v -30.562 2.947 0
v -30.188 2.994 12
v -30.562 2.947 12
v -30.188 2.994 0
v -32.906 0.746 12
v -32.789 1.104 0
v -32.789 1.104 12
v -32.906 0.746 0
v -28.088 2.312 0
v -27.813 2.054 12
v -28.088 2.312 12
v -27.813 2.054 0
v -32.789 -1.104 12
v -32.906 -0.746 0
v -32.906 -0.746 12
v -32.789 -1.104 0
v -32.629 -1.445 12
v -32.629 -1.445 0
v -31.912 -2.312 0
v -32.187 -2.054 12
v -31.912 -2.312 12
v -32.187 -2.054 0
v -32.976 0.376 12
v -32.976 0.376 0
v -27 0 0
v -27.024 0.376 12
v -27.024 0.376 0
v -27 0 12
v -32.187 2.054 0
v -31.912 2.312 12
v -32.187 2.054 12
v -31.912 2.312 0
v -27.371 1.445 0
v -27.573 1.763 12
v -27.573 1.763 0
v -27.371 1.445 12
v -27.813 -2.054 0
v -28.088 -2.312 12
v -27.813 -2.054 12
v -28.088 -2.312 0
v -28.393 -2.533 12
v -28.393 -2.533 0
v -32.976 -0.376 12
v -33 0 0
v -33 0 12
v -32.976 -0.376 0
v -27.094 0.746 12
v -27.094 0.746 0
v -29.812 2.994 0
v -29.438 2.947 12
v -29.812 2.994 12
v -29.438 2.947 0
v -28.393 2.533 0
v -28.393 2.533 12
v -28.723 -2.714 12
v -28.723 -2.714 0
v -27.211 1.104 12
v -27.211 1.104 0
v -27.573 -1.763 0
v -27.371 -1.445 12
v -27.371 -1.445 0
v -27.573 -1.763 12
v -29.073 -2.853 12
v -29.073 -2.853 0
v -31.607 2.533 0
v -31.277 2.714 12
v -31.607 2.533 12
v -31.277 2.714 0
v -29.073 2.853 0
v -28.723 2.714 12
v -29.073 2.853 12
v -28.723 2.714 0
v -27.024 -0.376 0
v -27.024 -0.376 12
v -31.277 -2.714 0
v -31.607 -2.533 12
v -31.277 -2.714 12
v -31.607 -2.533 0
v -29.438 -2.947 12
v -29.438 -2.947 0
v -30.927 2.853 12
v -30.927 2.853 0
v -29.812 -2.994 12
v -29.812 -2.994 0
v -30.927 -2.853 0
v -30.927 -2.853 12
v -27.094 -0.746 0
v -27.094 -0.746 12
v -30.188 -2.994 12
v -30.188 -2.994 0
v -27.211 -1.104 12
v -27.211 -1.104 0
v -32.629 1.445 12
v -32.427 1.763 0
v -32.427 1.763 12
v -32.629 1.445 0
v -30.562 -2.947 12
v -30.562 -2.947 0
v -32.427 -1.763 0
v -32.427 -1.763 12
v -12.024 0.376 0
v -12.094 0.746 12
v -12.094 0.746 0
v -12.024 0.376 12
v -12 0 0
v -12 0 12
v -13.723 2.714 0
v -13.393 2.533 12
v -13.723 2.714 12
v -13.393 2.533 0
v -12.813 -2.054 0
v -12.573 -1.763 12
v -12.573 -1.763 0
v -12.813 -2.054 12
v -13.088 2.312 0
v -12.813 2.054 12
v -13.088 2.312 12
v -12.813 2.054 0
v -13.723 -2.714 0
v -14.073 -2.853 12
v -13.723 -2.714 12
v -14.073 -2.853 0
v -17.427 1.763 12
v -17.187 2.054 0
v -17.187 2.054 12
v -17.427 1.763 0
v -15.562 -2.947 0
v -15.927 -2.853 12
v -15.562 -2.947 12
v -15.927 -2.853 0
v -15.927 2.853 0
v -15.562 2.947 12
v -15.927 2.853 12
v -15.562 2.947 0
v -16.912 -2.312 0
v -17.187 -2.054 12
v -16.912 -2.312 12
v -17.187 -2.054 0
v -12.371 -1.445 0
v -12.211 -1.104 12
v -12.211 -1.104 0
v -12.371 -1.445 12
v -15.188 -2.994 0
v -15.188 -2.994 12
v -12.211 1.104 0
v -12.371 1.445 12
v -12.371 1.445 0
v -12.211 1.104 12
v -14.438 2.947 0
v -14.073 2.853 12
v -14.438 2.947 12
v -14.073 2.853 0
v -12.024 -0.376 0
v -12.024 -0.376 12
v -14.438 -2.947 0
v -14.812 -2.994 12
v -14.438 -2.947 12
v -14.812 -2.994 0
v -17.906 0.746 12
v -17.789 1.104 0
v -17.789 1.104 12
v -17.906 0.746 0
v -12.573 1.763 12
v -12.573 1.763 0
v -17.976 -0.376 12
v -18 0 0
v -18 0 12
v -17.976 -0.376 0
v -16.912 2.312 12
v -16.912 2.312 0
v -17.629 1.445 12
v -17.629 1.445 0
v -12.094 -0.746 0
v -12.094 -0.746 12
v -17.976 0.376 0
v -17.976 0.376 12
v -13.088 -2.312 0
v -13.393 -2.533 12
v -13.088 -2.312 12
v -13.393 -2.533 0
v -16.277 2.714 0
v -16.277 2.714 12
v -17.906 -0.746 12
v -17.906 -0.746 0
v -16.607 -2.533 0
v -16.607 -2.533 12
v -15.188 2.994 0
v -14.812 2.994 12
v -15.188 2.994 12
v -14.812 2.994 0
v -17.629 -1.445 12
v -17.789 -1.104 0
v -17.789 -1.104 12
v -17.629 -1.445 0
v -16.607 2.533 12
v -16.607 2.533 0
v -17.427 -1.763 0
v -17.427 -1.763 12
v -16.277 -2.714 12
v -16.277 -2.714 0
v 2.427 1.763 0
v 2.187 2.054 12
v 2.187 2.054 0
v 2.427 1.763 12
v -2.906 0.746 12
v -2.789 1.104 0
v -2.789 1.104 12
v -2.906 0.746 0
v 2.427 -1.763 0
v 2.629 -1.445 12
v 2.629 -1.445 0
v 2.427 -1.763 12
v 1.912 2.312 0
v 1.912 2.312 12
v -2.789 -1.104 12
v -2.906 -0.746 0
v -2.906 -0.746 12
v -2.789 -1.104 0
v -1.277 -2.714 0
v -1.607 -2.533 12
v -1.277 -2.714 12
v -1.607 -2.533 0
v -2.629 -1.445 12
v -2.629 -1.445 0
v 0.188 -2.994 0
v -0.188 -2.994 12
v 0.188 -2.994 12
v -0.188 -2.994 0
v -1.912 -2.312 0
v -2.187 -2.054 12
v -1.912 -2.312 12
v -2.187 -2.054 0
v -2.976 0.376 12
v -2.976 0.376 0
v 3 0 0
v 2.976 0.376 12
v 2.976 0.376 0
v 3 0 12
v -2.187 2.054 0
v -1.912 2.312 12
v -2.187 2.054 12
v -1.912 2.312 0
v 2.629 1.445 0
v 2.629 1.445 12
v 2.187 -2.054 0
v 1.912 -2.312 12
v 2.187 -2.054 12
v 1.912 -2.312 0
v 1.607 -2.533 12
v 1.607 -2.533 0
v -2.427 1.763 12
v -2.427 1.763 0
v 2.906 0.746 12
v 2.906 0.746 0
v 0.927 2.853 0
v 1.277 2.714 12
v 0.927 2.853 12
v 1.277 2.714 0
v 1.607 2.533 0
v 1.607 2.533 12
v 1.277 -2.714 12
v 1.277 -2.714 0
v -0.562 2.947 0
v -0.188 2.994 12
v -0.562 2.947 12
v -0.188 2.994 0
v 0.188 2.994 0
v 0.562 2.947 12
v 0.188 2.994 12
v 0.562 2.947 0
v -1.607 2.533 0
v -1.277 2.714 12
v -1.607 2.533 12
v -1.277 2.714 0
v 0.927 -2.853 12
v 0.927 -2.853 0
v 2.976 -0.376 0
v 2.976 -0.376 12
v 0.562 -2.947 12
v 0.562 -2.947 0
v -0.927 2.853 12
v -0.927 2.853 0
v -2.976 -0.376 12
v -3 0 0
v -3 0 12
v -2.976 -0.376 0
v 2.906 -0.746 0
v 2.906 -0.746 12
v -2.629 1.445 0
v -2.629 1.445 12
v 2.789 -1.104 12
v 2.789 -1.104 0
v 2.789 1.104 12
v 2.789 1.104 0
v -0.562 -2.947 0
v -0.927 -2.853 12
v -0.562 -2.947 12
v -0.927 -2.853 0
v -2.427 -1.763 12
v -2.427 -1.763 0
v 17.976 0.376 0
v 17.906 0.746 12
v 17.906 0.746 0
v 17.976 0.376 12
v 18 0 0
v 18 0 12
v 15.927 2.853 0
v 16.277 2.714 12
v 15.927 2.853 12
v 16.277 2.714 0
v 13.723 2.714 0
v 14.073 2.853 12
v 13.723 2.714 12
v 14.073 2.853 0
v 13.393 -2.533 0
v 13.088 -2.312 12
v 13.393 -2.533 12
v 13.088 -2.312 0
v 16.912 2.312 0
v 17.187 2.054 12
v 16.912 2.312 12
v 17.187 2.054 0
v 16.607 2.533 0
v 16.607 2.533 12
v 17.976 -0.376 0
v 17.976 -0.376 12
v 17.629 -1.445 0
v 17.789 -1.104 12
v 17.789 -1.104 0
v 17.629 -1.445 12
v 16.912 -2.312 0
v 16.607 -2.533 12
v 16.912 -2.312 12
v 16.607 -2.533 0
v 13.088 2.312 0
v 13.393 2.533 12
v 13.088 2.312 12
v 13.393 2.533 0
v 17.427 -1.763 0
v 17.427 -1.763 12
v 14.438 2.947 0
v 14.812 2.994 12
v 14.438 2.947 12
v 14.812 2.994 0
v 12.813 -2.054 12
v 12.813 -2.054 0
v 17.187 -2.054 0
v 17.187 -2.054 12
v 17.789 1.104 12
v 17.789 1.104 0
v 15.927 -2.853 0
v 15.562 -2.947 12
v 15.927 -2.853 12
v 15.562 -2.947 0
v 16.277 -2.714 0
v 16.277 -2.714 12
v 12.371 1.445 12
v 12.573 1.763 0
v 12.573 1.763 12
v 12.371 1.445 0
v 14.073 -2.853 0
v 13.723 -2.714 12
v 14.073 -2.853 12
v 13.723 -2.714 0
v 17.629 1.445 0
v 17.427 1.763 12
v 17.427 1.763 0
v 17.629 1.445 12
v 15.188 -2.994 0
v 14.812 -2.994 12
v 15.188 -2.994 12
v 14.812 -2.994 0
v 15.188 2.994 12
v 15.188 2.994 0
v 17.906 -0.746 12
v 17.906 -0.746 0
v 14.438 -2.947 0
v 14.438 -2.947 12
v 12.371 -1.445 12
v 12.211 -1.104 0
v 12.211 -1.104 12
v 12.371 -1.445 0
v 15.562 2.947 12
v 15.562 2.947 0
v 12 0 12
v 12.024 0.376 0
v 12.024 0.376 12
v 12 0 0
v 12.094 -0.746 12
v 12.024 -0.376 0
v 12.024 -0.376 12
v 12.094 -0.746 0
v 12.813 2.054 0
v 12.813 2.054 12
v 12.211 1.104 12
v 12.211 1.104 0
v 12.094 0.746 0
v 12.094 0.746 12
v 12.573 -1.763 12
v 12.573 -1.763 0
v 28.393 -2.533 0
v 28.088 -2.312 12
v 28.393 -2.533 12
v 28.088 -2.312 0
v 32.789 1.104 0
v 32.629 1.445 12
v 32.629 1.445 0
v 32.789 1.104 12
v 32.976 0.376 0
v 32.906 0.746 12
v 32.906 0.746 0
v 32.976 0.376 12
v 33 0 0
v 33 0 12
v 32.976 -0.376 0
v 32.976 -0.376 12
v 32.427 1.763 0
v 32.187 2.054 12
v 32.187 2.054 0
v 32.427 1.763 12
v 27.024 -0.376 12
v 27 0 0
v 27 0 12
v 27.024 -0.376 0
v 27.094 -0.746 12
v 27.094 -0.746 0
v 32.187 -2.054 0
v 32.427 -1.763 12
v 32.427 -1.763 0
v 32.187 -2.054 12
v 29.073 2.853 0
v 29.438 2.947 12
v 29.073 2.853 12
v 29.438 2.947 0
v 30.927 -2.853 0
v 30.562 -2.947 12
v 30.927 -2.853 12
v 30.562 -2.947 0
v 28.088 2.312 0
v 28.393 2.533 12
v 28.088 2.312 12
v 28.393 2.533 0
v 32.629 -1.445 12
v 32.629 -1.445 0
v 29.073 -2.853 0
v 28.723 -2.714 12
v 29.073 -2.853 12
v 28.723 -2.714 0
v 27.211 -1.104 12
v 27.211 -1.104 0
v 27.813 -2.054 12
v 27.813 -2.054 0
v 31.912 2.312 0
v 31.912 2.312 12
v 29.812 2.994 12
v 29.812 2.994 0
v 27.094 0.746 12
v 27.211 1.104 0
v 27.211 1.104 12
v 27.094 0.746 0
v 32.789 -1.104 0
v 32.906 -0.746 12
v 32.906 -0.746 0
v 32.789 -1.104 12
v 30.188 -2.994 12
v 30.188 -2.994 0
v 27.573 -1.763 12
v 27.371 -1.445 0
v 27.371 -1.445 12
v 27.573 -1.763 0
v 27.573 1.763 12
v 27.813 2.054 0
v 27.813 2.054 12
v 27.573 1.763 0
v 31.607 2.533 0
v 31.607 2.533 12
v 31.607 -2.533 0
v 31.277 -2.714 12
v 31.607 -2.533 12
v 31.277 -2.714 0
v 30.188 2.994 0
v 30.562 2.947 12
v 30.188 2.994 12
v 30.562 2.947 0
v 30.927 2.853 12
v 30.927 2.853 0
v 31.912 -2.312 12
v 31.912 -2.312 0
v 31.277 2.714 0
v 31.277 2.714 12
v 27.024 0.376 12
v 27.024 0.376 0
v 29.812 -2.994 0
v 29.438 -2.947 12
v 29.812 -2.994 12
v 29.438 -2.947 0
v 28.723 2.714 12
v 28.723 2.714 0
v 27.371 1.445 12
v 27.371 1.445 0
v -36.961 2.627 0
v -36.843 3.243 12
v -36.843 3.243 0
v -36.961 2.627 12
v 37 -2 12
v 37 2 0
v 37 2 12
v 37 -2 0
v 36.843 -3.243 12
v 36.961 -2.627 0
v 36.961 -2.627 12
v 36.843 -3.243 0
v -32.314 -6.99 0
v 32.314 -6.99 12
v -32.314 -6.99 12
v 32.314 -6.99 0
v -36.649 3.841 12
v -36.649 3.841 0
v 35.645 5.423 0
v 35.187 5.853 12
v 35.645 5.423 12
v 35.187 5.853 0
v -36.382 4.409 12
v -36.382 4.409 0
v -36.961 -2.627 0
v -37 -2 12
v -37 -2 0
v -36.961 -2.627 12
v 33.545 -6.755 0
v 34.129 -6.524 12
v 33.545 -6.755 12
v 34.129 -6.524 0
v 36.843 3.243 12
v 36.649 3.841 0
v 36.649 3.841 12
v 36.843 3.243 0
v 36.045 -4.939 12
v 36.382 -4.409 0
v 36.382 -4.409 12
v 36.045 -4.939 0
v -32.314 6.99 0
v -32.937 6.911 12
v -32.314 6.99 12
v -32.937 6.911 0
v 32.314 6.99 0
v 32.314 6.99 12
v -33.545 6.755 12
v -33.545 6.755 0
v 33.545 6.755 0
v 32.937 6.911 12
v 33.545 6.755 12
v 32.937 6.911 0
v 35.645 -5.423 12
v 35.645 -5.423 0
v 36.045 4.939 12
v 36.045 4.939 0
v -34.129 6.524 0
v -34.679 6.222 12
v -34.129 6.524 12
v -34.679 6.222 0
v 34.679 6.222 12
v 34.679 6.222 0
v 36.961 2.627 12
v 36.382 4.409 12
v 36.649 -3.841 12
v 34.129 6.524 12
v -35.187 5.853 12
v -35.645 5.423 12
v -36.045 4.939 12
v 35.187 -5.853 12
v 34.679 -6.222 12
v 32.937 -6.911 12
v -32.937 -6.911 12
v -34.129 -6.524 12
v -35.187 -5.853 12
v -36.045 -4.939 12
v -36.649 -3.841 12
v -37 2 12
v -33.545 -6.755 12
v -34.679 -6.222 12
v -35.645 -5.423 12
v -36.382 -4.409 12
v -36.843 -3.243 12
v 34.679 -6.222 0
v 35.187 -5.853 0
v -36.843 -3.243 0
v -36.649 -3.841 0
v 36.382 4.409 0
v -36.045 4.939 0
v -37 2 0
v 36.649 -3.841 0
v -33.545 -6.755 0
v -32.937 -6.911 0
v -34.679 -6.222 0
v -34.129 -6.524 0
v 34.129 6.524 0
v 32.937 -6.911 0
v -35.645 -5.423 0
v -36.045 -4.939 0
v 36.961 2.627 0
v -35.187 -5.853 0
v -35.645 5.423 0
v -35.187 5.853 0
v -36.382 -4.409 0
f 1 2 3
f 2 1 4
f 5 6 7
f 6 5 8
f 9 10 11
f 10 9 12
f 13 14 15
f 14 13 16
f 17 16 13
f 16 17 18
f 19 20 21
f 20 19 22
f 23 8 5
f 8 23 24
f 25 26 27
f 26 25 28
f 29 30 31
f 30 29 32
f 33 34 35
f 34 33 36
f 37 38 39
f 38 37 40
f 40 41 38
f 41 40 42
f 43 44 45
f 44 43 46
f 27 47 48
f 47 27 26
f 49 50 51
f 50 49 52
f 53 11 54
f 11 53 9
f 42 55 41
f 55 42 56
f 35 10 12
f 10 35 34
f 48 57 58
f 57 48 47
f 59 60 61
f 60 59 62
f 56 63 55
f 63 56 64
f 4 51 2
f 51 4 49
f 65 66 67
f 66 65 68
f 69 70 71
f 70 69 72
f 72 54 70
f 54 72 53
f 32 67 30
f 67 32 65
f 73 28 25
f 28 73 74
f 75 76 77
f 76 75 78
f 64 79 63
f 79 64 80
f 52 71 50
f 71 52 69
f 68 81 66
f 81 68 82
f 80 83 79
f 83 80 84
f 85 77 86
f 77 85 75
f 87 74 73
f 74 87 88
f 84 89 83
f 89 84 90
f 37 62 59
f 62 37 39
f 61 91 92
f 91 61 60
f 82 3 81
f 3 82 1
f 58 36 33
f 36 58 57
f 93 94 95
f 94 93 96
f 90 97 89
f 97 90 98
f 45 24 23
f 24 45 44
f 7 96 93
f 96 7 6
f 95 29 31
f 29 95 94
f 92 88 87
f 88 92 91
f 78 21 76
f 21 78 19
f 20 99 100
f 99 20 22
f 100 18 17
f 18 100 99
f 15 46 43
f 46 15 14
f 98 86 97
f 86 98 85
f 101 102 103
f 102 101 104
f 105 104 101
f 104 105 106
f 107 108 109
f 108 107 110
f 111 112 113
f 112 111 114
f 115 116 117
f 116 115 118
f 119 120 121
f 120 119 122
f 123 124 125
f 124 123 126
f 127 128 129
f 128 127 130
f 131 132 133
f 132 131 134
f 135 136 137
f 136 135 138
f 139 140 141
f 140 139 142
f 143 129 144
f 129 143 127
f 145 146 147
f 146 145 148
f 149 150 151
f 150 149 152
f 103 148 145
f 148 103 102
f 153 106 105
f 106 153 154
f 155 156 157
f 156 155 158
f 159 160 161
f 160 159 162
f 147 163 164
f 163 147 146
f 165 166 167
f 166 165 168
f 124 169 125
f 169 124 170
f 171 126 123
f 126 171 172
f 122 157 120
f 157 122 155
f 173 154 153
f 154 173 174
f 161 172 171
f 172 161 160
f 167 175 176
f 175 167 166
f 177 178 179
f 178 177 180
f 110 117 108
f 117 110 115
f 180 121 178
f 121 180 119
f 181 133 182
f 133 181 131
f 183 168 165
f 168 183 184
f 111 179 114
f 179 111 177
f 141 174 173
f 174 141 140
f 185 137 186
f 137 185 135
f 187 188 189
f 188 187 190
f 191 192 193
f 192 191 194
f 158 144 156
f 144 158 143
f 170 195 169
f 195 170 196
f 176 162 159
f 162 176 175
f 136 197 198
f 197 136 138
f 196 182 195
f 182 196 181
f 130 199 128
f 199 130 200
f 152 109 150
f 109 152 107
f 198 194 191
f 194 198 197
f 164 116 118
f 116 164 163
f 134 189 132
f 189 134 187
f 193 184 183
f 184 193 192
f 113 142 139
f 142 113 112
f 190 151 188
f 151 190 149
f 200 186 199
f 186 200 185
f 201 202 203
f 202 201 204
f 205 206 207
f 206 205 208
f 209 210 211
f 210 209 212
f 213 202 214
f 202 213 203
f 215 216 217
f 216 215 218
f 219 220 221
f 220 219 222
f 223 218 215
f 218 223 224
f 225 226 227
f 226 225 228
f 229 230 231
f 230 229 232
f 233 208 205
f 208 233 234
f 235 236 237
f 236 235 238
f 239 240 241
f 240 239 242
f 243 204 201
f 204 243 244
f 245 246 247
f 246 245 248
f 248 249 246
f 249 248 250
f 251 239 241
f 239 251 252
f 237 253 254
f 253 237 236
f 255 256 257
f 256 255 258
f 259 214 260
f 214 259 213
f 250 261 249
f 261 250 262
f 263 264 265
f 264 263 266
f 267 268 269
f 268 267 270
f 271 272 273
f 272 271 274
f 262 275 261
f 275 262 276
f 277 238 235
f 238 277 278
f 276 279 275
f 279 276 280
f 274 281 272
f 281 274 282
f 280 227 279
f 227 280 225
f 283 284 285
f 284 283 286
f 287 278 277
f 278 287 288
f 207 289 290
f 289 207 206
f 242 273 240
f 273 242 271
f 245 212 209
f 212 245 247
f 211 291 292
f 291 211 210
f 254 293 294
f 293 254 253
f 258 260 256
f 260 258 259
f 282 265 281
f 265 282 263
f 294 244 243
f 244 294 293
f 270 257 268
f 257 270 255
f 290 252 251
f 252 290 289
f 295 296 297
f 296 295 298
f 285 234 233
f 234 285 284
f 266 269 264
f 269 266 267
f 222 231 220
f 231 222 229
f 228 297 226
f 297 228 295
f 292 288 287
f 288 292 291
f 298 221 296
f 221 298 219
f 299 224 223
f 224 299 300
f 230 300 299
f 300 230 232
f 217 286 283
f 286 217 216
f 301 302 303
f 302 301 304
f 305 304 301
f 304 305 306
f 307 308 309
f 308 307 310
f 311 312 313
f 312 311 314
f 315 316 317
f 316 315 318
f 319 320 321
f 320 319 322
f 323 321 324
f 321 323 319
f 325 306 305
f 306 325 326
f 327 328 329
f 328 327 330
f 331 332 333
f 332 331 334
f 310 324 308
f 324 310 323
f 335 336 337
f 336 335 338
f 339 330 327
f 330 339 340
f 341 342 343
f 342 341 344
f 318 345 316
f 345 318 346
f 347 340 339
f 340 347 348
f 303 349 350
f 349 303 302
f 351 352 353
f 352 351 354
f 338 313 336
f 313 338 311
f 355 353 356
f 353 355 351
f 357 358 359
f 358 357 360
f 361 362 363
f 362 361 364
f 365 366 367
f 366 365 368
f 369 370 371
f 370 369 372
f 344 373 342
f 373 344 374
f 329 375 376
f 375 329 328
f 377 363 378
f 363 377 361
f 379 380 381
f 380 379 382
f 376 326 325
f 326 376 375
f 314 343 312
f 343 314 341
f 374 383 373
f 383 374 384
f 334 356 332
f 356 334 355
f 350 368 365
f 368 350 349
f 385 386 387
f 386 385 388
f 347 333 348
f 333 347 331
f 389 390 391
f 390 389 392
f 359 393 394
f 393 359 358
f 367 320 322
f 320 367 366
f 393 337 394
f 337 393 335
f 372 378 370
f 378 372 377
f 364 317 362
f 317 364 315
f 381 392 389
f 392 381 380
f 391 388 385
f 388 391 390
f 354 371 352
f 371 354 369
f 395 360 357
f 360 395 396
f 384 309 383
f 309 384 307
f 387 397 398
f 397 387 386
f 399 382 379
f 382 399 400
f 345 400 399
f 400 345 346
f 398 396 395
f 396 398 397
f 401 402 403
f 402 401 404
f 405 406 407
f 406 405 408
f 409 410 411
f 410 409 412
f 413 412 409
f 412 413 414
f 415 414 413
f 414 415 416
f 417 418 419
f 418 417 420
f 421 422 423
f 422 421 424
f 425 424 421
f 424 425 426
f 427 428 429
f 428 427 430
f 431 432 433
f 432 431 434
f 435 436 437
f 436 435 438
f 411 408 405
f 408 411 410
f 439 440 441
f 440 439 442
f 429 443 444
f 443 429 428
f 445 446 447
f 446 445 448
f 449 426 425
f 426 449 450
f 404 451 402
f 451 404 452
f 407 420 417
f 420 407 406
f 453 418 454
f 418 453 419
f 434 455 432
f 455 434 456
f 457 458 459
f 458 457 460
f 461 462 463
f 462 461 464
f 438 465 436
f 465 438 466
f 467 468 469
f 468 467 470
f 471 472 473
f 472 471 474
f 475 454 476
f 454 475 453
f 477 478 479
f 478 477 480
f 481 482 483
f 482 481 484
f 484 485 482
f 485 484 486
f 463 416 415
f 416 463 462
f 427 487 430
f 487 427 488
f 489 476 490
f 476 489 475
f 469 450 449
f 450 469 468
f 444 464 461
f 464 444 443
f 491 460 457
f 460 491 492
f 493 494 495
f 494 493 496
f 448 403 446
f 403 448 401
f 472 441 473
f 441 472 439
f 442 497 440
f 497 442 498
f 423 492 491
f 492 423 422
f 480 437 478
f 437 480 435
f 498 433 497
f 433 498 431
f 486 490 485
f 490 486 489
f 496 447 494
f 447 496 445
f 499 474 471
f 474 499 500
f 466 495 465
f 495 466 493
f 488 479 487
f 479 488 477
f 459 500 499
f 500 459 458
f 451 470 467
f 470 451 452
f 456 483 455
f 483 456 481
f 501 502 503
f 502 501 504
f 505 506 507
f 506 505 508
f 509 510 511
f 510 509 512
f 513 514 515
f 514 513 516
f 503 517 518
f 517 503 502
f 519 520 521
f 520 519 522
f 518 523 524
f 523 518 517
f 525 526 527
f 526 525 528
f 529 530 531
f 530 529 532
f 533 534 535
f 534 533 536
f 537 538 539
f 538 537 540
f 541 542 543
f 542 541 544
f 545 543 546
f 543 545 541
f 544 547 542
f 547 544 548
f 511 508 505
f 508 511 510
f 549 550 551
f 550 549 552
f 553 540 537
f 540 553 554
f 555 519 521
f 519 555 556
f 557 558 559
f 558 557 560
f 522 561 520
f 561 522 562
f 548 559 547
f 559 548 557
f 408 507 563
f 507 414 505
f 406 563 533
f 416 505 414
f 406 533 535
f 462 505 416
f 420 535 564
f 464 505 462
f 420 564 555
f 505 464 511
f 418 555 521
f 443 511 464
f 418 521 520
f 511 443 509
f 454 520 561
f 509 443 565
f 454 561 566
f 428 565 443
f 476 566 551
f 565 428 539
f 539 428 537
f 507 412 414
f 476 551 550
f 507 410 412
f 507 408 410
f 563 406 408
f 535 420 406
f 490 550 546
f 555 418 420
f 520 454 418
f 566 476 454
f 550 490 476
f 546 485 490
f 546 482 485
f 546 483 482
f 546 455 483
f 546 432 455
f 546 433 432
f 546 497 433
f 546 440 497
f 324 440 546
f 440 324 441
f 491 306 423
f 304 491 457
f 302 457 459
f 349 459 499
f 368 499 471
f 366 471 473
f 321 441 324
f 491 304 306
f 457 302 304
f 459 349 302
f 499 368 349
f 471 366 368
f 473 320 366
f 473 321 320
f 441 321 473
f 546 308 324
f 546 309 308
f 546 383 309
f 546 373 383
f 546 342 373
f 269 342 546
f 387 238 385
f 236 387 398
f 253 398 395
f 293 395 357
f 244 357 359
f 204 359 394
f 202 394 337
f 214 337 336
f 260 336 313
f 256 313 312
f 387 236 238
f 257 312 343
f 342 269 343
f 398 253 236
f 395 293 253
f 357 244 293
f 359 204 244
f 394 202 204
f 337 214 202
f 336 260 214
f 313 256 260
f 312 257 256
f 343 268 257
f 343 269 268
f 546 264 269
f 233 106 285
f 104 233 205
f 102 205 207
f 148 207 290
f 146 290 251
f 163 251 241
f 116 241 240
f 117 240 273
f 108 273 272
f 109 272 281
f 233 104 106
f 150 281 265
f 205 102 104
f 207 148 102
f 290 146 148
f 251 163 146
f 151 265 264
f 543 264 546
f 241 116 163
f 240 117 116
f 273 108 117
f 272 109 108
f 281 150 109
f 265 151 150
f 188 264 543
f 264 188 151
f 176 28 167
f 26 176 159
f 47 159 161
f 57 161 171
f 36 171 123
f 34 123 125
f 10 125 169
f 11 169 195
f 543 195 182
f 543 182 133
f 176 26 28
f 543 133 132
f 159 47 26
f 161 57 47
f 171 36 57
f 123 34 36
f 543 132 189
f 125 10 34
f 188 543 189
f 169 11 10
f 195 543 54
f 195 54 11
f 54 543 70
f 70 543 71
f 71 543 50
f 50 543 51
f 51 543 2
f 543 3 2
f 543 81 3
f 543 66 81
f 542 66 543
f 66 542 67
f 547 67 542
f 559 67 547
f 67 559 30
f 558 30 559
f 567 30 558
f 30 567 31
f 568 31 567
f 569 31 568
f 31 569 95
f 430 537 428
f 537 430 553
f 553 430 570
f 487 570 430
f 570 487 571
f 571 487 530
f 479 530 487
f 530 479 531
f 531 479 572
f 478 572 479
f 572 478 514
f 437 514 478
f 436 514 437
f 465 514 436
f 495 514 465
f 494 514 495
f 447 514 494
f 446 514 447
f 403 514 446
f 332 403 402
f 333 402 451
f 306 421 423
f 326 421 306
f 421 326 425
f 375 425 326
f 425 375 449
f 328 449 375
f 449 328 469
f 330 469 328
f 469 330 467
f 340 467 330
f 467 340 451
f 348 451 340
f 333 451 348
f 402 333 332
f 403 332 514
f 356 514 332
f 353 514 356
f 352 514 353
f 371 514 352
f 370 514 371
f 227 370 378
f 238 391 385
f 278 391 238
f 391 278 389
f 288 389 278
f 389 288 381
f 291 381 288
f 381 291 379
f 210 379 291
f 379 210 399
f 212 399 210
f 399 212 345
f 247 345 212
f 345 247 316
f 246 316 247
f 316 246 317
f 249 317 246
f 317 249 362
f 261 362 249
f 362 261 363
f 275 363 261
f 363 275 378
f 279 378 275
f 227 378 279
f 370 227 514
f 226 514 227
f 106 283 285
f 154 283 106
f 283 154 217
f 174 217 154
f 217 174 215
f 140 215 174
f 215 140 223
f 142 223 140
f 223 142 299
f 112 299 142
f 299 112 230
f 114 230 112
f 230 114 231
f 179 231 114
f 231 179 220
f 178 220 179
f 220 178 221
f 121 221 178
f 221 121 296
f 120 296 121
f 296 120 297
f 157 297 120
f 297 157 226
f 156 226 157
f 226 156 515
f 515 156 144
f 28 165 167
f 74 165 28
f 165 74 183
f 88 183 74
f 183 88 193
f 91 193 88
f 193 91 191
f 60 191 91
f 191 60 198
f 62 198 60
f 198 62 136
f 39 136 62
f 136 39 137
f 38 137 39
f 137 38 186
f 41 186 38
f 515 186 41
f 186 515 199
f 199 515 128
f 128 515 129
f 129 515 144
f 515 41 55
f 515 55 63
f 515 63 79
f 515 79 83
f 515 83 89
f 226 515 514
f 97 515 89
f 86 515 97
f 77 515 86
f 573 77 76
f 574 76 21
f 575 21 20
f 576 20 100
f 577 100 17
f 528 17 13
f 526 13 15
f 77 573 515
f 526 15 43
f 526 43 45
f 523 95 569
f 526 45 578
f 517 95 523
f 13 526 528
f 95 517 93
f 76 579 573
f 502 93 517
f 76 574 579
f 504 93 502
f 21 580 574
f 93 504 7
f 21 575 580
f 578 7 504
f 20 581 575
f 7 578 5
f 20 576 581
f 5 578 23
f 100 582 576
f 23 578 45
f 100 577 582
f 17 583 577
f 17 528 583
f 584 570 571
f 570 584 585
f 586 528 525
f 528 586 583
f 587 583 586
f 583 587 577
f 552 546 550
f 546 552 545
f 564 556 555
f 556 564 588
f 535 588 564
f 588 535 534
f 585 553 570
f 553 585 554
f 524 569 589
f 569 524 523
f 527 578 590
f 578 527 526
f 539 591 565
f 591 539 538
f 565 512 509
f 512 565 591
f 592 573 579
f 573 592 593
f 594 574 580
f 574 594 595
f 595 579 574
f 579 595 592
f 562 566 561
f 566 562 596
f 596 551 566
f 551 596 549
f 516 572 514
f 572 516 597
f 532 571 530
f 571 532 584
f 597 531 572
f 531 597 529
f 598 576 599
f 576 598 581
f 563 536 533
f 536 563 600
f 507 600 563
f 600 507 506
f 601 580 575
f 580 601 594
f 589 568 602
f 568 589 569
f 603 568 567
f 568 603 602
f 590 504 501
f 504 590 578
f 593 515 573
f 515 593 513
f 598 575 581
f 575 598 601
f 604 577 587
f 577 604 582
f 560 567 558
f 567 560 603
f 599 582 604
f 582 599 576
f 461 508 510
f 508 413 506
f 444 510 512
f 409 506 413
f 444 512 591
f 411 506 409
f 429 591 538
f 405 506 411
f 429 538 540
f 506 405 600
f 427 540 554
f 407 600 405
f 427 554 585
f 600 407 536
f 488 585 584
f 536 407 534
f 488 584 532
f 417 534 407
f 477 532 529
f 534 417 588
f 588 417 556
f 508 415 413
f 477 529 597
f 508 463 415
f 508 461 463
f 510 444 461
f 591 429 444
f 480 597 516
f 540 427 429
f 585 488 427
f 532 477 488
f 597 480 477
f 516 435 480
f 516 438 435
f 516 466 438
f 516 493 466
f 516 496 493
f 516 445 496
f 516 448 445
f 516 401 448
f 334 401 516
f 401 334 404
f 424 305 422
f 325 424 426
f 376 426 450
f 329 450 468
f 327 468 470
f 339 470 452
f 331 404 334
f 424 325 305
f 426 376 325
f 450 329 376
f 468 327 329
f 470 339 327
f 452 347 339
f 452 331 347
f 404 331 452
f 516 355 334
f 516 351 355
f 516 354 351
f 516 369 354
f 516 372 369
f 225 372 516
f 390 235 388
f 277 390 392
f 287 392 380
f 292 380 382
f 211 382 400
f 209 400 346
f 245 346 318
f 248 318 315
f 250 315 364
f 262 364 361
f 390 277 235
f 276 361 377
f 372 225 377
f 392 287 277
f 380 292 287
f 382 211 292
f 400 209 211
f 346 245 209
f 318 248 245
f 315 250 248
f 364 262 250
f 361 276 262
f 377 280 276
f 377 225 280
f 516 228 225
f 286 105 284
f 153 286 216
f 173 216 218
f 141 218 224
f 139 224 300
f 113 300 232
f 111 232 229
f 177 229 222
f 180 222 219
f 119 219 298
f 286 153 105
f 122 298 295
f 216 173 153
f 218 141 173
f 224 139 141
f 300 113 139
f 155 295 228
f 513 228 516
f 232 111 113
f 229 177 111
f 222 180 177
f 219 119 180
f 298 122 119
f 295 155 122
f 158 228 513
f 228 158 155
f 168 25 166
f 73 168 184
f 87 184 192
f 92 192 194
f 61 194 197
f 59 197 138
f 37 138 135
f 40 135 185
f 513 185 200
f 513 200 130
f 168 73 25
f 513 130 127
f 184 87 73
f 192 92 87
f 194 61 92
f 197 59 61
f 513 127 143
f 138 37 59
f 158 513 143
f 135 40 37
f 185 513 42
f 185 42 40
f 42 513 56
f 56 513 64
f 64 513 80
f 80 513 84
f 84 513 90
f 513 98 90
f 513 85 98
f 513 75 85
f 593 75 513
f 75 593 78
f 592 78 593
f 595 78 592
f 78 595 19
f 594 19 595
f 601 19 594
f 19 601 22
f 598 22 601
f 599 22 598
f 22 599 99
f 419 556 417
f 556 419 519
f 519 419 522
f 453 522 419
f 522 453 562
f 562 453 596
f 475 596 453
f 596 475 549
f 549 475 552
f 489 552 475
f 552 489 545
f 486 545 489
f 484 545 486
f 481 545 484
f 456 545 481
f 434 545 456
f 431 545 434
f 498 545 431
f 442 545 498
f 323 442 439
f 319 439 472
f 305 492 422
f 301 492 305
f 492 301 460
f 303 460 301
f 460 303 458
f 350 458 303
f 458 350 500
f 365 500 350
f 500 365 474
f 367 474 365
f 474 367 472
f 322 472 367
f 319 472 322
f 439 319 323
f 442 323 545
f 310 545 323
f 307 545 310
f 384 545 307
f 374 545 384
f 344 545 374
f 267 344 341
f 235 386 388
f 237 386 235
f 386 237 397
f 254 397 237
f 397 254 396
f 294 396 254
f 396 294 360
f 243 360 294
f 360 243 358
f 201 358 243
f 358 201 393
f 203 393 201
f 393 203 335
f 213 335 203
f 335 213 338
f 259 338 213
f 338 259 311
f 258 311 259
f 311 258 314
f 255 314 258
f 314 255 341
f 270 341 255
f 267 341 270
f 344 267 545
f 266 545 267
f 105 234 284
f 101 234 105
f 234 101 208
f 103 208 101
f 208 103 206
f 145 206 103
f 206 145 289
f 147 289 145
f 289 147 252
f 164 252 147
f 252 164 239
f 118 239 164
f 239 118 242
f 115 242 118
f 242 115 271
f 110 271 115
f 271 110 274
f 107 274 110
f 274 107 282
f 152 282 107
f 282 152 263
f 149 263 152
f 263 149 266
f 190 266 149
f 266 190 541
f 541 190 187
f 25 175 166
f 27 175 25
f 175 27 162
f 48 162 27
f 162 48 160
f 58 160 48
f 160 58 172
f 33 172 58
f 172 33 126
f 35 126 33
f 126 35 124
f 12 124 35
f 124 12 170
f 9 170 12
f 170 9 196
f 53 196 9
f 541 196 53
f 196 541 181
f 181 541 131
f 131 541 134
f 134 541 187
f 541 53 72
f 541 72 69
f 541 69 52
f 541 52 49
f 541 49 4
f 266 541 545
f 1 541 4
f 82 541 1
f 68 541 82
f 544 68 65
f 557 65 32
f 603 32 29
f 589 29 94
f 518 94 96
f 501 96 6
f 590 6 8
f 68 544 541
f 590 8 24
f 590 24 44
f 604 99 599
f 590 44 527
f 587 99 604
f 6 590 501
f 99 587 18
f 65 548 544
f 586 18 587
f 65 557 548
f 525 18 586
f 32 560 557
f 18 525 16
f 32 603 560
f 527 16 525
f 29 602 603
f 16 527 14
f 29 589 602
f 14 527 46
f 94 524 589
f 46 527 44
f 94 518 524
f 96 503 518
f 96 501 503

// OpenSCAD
$fn = 50;


difference() {
	union() {
		hull() {
			translate(v = [-32.0000000000, 2.0000000000, 0]) {
				cylinder(h = 12, r = 5);
			}
			translate(v = [32.0000000000, 2.0000000000, 0]) {
				cylinder(h = 12, r = 5);
			}
			translate(v = [-32.0000000000, -2.0000000000, 0]) {
				cylinder(h = 12, r = 5);
			}
			translate(v = [32.0000000000, -2.0000000000, 0]) {
				cylinder(h = 12, r = 5);
			}
		}
	}
	union() {
		translate(v = [-30.0000000000, 0.0000000000, 0]) {
			translate(v = [0, 0, -100]) {
				cylinder(h = 200, r = 3.0000000000);
			}
		}
		translate(v = [-15.0000000000, 0.0000000000, 0]) {
			translate(v = [0, 0, -100]) {
				cylinder(h = 200, r = 3.0000000000);
			}
		}
		translate(v = [0, 0, -100]) {
			cylinder(h = 200, r = 3.0000000000);
		}
		translate(v = [15.0000000000, 0.0000000000, 0]) {
			translate(v = [0, 0, -100]) {
				cylinder(h = 200, r = 3.0000000000);
			}
		}
		translate(v = [30.0000000000, 0.0000000000, 0]) {
			translate(v = [0, 0, -100]) {
				cylinder(h = 200, r = 3.0000000000);
			}
		}
	}
}
